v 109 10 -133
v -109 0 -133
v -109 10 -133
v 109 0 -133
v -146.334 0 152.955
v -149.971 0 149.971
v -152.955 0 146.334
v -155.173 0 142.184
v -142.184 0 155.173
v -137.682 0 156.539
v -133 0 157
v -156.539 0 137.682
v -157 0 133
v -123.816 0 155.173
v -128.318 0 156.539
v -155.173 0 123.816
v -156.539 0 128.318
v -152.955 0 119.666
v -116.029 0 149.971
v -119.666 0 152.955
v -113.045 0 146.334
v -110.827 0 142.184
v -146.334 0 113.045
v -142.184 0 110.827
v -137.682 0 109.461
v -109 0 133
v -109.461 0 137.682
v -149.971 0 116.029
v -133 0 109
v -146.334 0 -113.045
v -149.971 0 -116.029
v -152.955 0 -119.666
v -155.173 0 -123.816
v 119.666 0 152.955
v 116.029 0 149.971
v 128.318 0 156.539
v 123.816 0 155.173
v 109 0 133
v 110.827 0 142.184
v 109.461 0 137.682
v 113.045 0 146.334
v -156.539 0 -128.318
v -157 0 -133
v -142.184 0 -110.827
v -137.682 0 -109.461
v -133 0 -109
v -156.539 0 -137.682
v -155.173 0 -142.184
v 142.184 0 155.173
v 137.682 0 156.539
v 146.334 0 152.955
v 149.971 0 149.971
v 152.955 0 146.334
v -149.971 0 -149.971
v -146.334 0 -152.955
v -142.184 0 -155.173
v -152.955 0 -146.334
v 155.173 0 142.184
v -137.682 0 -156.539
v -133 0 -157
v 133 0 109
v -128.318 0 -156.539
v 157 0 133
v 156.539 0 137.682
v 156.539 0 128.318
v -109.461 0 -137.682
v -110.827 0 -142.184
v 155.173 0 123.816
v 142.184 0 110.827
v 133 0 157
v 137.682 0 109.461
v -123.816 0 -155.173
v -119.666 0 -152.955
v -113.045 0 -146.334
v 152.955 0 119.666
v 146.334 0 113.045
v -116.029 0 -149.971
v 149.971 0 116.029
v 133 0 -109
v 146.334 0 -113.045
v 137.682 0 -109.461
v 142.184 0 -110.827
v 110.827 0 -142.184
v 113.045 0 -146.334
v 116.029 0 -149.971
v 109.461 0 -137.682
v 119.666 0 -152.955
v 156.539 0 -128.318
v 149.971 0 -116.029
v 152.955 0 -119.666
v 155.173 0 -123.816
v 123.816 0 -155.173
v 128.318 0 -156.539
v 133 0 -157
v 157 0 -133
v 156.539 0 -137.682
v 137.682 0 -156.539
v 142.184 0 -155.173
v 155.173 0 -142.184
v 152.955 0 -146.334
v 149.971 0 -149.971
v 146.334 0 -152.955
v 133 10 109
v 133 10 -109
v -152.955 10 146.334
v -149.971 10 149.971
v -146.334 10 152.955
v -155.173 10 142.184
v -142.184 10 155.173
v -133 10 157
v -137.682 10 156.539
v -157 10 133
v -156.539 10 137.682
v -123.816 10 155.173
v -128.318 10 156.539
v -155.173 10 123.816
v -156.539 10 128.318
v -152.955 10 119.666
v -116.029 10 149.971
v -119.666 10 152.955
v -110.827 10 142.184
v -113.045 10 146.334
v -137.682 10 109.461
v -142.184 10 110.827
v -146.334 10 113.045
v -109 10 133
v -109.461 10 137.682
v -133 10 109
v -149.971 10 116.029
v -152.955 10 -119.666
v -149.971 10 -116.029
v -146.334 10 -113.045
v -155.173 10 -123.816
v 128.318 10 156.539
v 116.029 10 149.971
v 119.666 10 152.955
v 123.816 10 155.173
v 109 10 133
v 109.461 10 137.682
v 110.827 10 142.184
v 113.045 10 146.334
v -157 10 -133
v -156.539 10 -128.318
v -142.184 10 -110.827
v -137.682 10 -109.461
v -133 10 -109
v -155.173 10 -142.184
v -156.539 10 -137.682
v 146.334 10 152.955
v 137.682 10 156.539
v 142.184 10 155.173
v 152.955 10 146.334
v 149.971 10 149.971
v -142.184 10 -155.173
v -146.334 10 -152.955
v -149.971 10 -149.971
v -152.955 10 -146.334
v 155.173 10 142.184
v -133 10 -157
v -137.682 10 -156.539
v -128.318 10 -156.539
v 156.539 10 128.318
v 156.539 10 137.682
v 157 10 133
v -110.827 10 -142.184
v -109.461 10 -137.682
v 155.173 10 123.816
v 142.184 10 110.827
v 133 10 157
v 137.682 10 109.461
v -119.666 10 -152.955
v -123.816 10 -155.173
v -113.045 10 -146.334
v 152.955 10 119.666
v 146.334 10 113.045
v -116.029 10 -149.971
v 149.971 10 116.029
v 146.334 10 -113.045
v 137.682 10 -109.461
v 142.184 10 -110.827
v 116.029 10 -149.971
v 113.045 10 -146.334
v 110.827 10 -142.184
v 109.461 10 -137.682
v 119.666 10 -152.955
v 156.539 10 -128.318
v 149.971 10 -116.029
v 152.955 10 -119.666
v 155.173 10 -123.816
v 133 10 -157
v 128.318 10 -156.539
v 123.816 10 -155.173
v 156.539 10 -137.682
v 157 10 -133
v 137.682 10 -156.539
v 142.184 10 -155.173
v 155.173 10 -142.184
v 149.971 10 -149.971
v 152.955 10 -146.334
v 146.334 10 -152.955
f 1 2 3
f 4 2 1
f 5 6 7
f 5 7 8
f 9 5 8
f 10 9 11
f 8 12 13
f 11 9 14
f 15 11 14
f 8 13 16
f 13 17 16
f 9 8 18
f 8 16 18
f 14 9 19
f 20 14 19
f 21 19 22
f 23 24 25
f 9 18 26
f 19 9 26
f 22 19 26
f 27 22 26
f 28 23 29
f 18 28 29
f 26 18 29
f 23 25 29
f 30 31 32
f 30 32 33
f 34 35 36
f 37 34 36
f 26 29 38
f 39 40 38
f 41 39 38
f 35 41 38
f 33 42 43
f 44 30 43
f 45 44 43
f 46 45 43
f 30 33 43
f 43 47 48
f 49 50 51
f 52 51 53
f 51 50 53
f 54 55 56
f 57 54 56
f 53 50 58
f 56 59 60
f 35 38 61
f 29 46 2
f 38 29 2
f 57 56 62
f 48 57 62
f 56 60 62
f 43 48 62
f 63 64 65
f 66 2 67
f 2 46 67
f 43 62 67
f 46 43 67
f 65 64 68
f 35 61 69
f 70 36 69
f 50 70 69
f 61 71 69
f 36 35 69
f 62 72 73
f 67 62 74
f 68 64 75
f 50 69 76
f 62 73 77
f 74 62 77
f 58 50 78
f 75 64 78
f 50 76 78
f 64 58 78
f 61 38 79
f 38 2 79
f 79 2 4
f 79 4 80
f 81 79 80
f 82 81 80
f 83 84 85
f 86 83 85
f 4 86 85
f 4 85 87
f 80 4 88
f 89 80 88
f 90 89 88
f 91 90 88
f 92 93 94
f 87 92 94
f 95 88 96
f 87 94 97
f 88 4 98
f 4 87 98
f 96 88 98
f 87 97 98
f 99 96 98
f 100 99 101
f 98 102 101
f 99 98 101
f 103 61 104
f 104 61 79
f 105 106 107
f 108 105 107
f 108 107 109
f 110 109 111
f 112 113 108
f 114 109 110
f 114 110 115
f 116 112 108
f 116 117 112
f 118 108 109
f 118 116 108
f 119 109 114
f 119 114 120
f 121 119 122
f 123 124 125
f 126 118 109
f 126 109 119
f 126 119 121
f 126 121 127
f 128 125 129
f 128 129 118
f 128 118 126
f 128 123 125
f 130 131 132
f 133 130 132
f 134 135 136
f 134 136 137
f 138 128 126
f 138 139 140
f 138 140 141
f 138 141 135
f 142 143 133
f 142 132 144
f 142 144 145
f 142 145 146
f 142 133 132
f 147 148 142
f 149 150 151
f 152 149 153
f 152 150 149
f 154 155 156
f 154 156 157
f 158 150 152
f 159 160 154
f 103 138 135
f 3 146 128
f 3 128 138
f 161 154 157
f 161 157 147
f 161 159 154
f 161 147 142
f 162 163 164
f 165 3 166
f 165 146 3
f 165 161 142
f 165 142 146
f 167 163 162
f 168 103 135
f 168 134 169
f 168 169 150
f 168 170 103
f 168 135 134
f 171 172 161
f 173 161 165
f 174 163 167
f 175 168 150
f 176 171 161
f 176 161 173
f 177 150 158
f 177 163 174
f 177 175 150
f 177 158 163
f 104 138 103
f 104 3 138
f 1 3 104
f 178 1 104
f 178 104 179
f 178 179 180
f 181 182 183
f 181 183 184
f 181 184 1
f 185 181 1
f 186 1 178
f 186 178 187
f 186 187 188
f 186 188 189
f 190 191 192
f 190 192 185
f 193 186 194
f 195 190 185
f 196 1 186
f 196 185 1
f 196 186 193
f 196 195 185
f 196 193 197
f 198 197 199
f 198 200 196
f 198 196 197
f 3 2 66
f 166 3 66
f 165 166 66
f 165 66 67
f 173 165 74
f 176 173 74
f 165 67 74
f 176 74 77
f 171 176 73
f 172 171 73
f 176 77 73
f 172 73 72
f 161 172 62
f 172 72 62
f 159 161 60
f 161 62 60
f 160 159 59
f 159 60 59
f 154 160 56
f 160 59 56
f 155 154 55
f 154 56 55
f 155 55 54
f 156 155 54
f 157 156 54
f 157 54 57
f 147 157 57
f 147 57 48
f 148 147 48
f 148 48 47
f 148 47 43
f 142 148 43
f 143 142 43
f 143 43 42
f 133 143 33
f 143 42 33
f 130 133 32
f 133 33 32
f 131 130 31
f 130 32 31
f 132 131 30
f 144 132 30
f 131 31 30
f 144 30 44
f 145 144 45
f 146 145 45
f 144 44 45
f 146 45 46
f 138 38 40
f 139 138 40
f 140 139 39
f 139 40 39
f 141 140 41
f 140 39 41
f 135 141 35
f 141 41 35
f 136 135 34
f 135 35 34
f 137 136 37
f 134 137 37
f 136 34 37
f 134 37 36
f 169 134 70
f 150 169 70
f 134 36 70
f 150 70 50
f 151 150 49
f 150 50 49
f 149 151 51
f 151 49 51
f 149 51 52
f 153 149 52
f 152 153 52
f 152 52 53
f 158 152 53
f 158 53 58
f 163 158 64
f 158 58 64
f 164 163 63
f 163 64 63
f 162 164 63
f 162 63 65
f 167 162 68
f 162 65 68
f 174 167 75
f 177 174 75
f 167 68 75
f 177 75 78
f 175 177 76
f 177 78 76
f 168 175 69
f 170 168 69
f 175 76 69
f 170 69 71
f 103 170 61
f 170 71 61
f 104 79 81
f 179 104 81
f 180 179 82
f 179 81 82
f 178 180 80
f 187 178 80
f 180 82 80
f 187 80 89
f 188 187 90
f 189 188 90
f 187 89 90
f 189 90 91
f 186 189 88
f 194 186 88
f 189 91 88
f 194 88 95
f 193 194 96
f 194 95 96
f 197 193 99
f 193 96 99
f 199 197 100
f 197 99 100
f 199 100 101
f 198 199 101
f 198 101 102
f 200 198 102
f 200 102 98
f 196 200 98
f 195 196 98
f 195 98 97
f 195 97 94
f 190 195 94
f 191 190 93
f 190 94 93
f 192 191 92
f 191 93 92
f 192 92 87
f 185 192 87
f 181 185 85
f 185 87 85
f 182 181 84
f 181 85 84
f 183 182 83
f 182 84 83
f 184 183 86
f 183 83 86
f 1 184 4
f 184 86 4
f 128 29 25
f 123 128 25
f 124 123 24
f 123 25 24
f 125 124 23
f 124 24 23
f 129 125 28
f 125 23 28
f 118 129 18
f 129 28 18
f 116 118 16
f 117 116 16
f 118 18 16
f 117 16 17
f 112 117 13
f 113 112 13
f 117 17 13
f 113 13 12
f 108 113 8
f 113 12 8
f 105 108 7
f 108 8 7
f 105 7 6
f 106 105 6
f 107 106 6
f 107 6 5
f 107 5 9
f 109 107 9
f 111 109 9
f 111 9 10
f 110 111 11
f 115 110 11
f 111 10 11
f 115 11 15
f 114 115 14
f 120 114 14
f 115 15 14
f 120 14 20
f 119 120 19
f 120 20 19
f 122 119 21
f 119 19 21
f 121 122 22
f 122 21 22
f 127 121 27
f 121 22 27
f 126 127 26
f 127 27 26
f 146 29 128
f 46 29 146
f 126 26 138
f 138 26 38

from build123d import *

# Parameters (mm, degrees)
SKETCH_1_R      = 24
SKETCH_1_W      = 266
SKETCH_1_H      = 266
EXTRUDE_1_DEPTH = 10


with BuildPart() as part:
    # 草图1 → 凸台-拉伸1 (new body)
    with BuildSketch(Plane(origin=(0, 0, 0), x_dir=(1, 0, 0), z_dir=(0, 1, 0))):
        with BuildLine():
            Line((-133, 109), (-133, 133))
            Line((-133, 133), (-109, 133))
            ThreePointArc((-109, 133), (-149.970562748, 149.970562748), (-133, 109))
        make_face()
        with BuildLine():
            Line((-109, 133), (-133, 133))
            Line((-133, 133), (-133, 109))
            ThreePointArc((-133, 109), (-116.029437252, 116.029437252), (-109, 133))
        make_face()
        with Locations((-133, -133)):
            Circle(SKETCH_1_R)
        with Locations((133, -133)):
            Circle(SKETCH_1_R)
        with Locations((133, 133)):
            Circle(SKETCH_1_R)
        with Locations((-133, 133)):
            Circle(SKETCH_1_R)
        Rectangle(SKETCH_1_W, SKETCH_1_H)
        with BuildLine():
            ThreePointArc((157, 133), (133, 157), (109, 133))
            Line((109, 133), (133, 133))
            Line((133, 133), (133, 109))
            ThreePointArc((133, 109), (149.970562748, 116.029437252), (157, 133))
        make_face()
        with BuildLine():
            Line((133, 133), (109, 133))
            ThreePointArc((109, 133), (116.029437252, 116.029437252), (133, 109))
            Line((133, 109), (133, 133))
        make_face()
        with BuildLine():
            ThreePointArc((157, -133), (149.970562748, -116.029437252), (133, -109))
            Line((133, -109), (133, -133))
            Line((133, -133), (109, -133))
            ThreePointArc((109, -133), (133, -157), (157, -133))
        make_face()
        with BuildLine():
            Line((133, -133), (133, -109))
            ThreePointArc((133, -109), (116.029437252, -116.029437252), (109, -133))
            Line((109, -133), (133, -133))
        make_face()
        with BuildLine():
            ThreePointArc((-109, -133), (-116.029437252, -116.029437252), (-133, -109))
            Line((-133, -109), (-133, -133))
            Line((-133, -133), (-109, -133))
        make_face()
        with BuildLine():
            Line((-133, -133), (-133, -109))
            ThreePointArc((-133, -109), (-149.970562748, -149.970562748), (-109, -133))
            Line((-109, -133), (-133, -133))
        make_face()
    extrude(amount=EXTRUDE_1_DEPTH)


solid = part.part
